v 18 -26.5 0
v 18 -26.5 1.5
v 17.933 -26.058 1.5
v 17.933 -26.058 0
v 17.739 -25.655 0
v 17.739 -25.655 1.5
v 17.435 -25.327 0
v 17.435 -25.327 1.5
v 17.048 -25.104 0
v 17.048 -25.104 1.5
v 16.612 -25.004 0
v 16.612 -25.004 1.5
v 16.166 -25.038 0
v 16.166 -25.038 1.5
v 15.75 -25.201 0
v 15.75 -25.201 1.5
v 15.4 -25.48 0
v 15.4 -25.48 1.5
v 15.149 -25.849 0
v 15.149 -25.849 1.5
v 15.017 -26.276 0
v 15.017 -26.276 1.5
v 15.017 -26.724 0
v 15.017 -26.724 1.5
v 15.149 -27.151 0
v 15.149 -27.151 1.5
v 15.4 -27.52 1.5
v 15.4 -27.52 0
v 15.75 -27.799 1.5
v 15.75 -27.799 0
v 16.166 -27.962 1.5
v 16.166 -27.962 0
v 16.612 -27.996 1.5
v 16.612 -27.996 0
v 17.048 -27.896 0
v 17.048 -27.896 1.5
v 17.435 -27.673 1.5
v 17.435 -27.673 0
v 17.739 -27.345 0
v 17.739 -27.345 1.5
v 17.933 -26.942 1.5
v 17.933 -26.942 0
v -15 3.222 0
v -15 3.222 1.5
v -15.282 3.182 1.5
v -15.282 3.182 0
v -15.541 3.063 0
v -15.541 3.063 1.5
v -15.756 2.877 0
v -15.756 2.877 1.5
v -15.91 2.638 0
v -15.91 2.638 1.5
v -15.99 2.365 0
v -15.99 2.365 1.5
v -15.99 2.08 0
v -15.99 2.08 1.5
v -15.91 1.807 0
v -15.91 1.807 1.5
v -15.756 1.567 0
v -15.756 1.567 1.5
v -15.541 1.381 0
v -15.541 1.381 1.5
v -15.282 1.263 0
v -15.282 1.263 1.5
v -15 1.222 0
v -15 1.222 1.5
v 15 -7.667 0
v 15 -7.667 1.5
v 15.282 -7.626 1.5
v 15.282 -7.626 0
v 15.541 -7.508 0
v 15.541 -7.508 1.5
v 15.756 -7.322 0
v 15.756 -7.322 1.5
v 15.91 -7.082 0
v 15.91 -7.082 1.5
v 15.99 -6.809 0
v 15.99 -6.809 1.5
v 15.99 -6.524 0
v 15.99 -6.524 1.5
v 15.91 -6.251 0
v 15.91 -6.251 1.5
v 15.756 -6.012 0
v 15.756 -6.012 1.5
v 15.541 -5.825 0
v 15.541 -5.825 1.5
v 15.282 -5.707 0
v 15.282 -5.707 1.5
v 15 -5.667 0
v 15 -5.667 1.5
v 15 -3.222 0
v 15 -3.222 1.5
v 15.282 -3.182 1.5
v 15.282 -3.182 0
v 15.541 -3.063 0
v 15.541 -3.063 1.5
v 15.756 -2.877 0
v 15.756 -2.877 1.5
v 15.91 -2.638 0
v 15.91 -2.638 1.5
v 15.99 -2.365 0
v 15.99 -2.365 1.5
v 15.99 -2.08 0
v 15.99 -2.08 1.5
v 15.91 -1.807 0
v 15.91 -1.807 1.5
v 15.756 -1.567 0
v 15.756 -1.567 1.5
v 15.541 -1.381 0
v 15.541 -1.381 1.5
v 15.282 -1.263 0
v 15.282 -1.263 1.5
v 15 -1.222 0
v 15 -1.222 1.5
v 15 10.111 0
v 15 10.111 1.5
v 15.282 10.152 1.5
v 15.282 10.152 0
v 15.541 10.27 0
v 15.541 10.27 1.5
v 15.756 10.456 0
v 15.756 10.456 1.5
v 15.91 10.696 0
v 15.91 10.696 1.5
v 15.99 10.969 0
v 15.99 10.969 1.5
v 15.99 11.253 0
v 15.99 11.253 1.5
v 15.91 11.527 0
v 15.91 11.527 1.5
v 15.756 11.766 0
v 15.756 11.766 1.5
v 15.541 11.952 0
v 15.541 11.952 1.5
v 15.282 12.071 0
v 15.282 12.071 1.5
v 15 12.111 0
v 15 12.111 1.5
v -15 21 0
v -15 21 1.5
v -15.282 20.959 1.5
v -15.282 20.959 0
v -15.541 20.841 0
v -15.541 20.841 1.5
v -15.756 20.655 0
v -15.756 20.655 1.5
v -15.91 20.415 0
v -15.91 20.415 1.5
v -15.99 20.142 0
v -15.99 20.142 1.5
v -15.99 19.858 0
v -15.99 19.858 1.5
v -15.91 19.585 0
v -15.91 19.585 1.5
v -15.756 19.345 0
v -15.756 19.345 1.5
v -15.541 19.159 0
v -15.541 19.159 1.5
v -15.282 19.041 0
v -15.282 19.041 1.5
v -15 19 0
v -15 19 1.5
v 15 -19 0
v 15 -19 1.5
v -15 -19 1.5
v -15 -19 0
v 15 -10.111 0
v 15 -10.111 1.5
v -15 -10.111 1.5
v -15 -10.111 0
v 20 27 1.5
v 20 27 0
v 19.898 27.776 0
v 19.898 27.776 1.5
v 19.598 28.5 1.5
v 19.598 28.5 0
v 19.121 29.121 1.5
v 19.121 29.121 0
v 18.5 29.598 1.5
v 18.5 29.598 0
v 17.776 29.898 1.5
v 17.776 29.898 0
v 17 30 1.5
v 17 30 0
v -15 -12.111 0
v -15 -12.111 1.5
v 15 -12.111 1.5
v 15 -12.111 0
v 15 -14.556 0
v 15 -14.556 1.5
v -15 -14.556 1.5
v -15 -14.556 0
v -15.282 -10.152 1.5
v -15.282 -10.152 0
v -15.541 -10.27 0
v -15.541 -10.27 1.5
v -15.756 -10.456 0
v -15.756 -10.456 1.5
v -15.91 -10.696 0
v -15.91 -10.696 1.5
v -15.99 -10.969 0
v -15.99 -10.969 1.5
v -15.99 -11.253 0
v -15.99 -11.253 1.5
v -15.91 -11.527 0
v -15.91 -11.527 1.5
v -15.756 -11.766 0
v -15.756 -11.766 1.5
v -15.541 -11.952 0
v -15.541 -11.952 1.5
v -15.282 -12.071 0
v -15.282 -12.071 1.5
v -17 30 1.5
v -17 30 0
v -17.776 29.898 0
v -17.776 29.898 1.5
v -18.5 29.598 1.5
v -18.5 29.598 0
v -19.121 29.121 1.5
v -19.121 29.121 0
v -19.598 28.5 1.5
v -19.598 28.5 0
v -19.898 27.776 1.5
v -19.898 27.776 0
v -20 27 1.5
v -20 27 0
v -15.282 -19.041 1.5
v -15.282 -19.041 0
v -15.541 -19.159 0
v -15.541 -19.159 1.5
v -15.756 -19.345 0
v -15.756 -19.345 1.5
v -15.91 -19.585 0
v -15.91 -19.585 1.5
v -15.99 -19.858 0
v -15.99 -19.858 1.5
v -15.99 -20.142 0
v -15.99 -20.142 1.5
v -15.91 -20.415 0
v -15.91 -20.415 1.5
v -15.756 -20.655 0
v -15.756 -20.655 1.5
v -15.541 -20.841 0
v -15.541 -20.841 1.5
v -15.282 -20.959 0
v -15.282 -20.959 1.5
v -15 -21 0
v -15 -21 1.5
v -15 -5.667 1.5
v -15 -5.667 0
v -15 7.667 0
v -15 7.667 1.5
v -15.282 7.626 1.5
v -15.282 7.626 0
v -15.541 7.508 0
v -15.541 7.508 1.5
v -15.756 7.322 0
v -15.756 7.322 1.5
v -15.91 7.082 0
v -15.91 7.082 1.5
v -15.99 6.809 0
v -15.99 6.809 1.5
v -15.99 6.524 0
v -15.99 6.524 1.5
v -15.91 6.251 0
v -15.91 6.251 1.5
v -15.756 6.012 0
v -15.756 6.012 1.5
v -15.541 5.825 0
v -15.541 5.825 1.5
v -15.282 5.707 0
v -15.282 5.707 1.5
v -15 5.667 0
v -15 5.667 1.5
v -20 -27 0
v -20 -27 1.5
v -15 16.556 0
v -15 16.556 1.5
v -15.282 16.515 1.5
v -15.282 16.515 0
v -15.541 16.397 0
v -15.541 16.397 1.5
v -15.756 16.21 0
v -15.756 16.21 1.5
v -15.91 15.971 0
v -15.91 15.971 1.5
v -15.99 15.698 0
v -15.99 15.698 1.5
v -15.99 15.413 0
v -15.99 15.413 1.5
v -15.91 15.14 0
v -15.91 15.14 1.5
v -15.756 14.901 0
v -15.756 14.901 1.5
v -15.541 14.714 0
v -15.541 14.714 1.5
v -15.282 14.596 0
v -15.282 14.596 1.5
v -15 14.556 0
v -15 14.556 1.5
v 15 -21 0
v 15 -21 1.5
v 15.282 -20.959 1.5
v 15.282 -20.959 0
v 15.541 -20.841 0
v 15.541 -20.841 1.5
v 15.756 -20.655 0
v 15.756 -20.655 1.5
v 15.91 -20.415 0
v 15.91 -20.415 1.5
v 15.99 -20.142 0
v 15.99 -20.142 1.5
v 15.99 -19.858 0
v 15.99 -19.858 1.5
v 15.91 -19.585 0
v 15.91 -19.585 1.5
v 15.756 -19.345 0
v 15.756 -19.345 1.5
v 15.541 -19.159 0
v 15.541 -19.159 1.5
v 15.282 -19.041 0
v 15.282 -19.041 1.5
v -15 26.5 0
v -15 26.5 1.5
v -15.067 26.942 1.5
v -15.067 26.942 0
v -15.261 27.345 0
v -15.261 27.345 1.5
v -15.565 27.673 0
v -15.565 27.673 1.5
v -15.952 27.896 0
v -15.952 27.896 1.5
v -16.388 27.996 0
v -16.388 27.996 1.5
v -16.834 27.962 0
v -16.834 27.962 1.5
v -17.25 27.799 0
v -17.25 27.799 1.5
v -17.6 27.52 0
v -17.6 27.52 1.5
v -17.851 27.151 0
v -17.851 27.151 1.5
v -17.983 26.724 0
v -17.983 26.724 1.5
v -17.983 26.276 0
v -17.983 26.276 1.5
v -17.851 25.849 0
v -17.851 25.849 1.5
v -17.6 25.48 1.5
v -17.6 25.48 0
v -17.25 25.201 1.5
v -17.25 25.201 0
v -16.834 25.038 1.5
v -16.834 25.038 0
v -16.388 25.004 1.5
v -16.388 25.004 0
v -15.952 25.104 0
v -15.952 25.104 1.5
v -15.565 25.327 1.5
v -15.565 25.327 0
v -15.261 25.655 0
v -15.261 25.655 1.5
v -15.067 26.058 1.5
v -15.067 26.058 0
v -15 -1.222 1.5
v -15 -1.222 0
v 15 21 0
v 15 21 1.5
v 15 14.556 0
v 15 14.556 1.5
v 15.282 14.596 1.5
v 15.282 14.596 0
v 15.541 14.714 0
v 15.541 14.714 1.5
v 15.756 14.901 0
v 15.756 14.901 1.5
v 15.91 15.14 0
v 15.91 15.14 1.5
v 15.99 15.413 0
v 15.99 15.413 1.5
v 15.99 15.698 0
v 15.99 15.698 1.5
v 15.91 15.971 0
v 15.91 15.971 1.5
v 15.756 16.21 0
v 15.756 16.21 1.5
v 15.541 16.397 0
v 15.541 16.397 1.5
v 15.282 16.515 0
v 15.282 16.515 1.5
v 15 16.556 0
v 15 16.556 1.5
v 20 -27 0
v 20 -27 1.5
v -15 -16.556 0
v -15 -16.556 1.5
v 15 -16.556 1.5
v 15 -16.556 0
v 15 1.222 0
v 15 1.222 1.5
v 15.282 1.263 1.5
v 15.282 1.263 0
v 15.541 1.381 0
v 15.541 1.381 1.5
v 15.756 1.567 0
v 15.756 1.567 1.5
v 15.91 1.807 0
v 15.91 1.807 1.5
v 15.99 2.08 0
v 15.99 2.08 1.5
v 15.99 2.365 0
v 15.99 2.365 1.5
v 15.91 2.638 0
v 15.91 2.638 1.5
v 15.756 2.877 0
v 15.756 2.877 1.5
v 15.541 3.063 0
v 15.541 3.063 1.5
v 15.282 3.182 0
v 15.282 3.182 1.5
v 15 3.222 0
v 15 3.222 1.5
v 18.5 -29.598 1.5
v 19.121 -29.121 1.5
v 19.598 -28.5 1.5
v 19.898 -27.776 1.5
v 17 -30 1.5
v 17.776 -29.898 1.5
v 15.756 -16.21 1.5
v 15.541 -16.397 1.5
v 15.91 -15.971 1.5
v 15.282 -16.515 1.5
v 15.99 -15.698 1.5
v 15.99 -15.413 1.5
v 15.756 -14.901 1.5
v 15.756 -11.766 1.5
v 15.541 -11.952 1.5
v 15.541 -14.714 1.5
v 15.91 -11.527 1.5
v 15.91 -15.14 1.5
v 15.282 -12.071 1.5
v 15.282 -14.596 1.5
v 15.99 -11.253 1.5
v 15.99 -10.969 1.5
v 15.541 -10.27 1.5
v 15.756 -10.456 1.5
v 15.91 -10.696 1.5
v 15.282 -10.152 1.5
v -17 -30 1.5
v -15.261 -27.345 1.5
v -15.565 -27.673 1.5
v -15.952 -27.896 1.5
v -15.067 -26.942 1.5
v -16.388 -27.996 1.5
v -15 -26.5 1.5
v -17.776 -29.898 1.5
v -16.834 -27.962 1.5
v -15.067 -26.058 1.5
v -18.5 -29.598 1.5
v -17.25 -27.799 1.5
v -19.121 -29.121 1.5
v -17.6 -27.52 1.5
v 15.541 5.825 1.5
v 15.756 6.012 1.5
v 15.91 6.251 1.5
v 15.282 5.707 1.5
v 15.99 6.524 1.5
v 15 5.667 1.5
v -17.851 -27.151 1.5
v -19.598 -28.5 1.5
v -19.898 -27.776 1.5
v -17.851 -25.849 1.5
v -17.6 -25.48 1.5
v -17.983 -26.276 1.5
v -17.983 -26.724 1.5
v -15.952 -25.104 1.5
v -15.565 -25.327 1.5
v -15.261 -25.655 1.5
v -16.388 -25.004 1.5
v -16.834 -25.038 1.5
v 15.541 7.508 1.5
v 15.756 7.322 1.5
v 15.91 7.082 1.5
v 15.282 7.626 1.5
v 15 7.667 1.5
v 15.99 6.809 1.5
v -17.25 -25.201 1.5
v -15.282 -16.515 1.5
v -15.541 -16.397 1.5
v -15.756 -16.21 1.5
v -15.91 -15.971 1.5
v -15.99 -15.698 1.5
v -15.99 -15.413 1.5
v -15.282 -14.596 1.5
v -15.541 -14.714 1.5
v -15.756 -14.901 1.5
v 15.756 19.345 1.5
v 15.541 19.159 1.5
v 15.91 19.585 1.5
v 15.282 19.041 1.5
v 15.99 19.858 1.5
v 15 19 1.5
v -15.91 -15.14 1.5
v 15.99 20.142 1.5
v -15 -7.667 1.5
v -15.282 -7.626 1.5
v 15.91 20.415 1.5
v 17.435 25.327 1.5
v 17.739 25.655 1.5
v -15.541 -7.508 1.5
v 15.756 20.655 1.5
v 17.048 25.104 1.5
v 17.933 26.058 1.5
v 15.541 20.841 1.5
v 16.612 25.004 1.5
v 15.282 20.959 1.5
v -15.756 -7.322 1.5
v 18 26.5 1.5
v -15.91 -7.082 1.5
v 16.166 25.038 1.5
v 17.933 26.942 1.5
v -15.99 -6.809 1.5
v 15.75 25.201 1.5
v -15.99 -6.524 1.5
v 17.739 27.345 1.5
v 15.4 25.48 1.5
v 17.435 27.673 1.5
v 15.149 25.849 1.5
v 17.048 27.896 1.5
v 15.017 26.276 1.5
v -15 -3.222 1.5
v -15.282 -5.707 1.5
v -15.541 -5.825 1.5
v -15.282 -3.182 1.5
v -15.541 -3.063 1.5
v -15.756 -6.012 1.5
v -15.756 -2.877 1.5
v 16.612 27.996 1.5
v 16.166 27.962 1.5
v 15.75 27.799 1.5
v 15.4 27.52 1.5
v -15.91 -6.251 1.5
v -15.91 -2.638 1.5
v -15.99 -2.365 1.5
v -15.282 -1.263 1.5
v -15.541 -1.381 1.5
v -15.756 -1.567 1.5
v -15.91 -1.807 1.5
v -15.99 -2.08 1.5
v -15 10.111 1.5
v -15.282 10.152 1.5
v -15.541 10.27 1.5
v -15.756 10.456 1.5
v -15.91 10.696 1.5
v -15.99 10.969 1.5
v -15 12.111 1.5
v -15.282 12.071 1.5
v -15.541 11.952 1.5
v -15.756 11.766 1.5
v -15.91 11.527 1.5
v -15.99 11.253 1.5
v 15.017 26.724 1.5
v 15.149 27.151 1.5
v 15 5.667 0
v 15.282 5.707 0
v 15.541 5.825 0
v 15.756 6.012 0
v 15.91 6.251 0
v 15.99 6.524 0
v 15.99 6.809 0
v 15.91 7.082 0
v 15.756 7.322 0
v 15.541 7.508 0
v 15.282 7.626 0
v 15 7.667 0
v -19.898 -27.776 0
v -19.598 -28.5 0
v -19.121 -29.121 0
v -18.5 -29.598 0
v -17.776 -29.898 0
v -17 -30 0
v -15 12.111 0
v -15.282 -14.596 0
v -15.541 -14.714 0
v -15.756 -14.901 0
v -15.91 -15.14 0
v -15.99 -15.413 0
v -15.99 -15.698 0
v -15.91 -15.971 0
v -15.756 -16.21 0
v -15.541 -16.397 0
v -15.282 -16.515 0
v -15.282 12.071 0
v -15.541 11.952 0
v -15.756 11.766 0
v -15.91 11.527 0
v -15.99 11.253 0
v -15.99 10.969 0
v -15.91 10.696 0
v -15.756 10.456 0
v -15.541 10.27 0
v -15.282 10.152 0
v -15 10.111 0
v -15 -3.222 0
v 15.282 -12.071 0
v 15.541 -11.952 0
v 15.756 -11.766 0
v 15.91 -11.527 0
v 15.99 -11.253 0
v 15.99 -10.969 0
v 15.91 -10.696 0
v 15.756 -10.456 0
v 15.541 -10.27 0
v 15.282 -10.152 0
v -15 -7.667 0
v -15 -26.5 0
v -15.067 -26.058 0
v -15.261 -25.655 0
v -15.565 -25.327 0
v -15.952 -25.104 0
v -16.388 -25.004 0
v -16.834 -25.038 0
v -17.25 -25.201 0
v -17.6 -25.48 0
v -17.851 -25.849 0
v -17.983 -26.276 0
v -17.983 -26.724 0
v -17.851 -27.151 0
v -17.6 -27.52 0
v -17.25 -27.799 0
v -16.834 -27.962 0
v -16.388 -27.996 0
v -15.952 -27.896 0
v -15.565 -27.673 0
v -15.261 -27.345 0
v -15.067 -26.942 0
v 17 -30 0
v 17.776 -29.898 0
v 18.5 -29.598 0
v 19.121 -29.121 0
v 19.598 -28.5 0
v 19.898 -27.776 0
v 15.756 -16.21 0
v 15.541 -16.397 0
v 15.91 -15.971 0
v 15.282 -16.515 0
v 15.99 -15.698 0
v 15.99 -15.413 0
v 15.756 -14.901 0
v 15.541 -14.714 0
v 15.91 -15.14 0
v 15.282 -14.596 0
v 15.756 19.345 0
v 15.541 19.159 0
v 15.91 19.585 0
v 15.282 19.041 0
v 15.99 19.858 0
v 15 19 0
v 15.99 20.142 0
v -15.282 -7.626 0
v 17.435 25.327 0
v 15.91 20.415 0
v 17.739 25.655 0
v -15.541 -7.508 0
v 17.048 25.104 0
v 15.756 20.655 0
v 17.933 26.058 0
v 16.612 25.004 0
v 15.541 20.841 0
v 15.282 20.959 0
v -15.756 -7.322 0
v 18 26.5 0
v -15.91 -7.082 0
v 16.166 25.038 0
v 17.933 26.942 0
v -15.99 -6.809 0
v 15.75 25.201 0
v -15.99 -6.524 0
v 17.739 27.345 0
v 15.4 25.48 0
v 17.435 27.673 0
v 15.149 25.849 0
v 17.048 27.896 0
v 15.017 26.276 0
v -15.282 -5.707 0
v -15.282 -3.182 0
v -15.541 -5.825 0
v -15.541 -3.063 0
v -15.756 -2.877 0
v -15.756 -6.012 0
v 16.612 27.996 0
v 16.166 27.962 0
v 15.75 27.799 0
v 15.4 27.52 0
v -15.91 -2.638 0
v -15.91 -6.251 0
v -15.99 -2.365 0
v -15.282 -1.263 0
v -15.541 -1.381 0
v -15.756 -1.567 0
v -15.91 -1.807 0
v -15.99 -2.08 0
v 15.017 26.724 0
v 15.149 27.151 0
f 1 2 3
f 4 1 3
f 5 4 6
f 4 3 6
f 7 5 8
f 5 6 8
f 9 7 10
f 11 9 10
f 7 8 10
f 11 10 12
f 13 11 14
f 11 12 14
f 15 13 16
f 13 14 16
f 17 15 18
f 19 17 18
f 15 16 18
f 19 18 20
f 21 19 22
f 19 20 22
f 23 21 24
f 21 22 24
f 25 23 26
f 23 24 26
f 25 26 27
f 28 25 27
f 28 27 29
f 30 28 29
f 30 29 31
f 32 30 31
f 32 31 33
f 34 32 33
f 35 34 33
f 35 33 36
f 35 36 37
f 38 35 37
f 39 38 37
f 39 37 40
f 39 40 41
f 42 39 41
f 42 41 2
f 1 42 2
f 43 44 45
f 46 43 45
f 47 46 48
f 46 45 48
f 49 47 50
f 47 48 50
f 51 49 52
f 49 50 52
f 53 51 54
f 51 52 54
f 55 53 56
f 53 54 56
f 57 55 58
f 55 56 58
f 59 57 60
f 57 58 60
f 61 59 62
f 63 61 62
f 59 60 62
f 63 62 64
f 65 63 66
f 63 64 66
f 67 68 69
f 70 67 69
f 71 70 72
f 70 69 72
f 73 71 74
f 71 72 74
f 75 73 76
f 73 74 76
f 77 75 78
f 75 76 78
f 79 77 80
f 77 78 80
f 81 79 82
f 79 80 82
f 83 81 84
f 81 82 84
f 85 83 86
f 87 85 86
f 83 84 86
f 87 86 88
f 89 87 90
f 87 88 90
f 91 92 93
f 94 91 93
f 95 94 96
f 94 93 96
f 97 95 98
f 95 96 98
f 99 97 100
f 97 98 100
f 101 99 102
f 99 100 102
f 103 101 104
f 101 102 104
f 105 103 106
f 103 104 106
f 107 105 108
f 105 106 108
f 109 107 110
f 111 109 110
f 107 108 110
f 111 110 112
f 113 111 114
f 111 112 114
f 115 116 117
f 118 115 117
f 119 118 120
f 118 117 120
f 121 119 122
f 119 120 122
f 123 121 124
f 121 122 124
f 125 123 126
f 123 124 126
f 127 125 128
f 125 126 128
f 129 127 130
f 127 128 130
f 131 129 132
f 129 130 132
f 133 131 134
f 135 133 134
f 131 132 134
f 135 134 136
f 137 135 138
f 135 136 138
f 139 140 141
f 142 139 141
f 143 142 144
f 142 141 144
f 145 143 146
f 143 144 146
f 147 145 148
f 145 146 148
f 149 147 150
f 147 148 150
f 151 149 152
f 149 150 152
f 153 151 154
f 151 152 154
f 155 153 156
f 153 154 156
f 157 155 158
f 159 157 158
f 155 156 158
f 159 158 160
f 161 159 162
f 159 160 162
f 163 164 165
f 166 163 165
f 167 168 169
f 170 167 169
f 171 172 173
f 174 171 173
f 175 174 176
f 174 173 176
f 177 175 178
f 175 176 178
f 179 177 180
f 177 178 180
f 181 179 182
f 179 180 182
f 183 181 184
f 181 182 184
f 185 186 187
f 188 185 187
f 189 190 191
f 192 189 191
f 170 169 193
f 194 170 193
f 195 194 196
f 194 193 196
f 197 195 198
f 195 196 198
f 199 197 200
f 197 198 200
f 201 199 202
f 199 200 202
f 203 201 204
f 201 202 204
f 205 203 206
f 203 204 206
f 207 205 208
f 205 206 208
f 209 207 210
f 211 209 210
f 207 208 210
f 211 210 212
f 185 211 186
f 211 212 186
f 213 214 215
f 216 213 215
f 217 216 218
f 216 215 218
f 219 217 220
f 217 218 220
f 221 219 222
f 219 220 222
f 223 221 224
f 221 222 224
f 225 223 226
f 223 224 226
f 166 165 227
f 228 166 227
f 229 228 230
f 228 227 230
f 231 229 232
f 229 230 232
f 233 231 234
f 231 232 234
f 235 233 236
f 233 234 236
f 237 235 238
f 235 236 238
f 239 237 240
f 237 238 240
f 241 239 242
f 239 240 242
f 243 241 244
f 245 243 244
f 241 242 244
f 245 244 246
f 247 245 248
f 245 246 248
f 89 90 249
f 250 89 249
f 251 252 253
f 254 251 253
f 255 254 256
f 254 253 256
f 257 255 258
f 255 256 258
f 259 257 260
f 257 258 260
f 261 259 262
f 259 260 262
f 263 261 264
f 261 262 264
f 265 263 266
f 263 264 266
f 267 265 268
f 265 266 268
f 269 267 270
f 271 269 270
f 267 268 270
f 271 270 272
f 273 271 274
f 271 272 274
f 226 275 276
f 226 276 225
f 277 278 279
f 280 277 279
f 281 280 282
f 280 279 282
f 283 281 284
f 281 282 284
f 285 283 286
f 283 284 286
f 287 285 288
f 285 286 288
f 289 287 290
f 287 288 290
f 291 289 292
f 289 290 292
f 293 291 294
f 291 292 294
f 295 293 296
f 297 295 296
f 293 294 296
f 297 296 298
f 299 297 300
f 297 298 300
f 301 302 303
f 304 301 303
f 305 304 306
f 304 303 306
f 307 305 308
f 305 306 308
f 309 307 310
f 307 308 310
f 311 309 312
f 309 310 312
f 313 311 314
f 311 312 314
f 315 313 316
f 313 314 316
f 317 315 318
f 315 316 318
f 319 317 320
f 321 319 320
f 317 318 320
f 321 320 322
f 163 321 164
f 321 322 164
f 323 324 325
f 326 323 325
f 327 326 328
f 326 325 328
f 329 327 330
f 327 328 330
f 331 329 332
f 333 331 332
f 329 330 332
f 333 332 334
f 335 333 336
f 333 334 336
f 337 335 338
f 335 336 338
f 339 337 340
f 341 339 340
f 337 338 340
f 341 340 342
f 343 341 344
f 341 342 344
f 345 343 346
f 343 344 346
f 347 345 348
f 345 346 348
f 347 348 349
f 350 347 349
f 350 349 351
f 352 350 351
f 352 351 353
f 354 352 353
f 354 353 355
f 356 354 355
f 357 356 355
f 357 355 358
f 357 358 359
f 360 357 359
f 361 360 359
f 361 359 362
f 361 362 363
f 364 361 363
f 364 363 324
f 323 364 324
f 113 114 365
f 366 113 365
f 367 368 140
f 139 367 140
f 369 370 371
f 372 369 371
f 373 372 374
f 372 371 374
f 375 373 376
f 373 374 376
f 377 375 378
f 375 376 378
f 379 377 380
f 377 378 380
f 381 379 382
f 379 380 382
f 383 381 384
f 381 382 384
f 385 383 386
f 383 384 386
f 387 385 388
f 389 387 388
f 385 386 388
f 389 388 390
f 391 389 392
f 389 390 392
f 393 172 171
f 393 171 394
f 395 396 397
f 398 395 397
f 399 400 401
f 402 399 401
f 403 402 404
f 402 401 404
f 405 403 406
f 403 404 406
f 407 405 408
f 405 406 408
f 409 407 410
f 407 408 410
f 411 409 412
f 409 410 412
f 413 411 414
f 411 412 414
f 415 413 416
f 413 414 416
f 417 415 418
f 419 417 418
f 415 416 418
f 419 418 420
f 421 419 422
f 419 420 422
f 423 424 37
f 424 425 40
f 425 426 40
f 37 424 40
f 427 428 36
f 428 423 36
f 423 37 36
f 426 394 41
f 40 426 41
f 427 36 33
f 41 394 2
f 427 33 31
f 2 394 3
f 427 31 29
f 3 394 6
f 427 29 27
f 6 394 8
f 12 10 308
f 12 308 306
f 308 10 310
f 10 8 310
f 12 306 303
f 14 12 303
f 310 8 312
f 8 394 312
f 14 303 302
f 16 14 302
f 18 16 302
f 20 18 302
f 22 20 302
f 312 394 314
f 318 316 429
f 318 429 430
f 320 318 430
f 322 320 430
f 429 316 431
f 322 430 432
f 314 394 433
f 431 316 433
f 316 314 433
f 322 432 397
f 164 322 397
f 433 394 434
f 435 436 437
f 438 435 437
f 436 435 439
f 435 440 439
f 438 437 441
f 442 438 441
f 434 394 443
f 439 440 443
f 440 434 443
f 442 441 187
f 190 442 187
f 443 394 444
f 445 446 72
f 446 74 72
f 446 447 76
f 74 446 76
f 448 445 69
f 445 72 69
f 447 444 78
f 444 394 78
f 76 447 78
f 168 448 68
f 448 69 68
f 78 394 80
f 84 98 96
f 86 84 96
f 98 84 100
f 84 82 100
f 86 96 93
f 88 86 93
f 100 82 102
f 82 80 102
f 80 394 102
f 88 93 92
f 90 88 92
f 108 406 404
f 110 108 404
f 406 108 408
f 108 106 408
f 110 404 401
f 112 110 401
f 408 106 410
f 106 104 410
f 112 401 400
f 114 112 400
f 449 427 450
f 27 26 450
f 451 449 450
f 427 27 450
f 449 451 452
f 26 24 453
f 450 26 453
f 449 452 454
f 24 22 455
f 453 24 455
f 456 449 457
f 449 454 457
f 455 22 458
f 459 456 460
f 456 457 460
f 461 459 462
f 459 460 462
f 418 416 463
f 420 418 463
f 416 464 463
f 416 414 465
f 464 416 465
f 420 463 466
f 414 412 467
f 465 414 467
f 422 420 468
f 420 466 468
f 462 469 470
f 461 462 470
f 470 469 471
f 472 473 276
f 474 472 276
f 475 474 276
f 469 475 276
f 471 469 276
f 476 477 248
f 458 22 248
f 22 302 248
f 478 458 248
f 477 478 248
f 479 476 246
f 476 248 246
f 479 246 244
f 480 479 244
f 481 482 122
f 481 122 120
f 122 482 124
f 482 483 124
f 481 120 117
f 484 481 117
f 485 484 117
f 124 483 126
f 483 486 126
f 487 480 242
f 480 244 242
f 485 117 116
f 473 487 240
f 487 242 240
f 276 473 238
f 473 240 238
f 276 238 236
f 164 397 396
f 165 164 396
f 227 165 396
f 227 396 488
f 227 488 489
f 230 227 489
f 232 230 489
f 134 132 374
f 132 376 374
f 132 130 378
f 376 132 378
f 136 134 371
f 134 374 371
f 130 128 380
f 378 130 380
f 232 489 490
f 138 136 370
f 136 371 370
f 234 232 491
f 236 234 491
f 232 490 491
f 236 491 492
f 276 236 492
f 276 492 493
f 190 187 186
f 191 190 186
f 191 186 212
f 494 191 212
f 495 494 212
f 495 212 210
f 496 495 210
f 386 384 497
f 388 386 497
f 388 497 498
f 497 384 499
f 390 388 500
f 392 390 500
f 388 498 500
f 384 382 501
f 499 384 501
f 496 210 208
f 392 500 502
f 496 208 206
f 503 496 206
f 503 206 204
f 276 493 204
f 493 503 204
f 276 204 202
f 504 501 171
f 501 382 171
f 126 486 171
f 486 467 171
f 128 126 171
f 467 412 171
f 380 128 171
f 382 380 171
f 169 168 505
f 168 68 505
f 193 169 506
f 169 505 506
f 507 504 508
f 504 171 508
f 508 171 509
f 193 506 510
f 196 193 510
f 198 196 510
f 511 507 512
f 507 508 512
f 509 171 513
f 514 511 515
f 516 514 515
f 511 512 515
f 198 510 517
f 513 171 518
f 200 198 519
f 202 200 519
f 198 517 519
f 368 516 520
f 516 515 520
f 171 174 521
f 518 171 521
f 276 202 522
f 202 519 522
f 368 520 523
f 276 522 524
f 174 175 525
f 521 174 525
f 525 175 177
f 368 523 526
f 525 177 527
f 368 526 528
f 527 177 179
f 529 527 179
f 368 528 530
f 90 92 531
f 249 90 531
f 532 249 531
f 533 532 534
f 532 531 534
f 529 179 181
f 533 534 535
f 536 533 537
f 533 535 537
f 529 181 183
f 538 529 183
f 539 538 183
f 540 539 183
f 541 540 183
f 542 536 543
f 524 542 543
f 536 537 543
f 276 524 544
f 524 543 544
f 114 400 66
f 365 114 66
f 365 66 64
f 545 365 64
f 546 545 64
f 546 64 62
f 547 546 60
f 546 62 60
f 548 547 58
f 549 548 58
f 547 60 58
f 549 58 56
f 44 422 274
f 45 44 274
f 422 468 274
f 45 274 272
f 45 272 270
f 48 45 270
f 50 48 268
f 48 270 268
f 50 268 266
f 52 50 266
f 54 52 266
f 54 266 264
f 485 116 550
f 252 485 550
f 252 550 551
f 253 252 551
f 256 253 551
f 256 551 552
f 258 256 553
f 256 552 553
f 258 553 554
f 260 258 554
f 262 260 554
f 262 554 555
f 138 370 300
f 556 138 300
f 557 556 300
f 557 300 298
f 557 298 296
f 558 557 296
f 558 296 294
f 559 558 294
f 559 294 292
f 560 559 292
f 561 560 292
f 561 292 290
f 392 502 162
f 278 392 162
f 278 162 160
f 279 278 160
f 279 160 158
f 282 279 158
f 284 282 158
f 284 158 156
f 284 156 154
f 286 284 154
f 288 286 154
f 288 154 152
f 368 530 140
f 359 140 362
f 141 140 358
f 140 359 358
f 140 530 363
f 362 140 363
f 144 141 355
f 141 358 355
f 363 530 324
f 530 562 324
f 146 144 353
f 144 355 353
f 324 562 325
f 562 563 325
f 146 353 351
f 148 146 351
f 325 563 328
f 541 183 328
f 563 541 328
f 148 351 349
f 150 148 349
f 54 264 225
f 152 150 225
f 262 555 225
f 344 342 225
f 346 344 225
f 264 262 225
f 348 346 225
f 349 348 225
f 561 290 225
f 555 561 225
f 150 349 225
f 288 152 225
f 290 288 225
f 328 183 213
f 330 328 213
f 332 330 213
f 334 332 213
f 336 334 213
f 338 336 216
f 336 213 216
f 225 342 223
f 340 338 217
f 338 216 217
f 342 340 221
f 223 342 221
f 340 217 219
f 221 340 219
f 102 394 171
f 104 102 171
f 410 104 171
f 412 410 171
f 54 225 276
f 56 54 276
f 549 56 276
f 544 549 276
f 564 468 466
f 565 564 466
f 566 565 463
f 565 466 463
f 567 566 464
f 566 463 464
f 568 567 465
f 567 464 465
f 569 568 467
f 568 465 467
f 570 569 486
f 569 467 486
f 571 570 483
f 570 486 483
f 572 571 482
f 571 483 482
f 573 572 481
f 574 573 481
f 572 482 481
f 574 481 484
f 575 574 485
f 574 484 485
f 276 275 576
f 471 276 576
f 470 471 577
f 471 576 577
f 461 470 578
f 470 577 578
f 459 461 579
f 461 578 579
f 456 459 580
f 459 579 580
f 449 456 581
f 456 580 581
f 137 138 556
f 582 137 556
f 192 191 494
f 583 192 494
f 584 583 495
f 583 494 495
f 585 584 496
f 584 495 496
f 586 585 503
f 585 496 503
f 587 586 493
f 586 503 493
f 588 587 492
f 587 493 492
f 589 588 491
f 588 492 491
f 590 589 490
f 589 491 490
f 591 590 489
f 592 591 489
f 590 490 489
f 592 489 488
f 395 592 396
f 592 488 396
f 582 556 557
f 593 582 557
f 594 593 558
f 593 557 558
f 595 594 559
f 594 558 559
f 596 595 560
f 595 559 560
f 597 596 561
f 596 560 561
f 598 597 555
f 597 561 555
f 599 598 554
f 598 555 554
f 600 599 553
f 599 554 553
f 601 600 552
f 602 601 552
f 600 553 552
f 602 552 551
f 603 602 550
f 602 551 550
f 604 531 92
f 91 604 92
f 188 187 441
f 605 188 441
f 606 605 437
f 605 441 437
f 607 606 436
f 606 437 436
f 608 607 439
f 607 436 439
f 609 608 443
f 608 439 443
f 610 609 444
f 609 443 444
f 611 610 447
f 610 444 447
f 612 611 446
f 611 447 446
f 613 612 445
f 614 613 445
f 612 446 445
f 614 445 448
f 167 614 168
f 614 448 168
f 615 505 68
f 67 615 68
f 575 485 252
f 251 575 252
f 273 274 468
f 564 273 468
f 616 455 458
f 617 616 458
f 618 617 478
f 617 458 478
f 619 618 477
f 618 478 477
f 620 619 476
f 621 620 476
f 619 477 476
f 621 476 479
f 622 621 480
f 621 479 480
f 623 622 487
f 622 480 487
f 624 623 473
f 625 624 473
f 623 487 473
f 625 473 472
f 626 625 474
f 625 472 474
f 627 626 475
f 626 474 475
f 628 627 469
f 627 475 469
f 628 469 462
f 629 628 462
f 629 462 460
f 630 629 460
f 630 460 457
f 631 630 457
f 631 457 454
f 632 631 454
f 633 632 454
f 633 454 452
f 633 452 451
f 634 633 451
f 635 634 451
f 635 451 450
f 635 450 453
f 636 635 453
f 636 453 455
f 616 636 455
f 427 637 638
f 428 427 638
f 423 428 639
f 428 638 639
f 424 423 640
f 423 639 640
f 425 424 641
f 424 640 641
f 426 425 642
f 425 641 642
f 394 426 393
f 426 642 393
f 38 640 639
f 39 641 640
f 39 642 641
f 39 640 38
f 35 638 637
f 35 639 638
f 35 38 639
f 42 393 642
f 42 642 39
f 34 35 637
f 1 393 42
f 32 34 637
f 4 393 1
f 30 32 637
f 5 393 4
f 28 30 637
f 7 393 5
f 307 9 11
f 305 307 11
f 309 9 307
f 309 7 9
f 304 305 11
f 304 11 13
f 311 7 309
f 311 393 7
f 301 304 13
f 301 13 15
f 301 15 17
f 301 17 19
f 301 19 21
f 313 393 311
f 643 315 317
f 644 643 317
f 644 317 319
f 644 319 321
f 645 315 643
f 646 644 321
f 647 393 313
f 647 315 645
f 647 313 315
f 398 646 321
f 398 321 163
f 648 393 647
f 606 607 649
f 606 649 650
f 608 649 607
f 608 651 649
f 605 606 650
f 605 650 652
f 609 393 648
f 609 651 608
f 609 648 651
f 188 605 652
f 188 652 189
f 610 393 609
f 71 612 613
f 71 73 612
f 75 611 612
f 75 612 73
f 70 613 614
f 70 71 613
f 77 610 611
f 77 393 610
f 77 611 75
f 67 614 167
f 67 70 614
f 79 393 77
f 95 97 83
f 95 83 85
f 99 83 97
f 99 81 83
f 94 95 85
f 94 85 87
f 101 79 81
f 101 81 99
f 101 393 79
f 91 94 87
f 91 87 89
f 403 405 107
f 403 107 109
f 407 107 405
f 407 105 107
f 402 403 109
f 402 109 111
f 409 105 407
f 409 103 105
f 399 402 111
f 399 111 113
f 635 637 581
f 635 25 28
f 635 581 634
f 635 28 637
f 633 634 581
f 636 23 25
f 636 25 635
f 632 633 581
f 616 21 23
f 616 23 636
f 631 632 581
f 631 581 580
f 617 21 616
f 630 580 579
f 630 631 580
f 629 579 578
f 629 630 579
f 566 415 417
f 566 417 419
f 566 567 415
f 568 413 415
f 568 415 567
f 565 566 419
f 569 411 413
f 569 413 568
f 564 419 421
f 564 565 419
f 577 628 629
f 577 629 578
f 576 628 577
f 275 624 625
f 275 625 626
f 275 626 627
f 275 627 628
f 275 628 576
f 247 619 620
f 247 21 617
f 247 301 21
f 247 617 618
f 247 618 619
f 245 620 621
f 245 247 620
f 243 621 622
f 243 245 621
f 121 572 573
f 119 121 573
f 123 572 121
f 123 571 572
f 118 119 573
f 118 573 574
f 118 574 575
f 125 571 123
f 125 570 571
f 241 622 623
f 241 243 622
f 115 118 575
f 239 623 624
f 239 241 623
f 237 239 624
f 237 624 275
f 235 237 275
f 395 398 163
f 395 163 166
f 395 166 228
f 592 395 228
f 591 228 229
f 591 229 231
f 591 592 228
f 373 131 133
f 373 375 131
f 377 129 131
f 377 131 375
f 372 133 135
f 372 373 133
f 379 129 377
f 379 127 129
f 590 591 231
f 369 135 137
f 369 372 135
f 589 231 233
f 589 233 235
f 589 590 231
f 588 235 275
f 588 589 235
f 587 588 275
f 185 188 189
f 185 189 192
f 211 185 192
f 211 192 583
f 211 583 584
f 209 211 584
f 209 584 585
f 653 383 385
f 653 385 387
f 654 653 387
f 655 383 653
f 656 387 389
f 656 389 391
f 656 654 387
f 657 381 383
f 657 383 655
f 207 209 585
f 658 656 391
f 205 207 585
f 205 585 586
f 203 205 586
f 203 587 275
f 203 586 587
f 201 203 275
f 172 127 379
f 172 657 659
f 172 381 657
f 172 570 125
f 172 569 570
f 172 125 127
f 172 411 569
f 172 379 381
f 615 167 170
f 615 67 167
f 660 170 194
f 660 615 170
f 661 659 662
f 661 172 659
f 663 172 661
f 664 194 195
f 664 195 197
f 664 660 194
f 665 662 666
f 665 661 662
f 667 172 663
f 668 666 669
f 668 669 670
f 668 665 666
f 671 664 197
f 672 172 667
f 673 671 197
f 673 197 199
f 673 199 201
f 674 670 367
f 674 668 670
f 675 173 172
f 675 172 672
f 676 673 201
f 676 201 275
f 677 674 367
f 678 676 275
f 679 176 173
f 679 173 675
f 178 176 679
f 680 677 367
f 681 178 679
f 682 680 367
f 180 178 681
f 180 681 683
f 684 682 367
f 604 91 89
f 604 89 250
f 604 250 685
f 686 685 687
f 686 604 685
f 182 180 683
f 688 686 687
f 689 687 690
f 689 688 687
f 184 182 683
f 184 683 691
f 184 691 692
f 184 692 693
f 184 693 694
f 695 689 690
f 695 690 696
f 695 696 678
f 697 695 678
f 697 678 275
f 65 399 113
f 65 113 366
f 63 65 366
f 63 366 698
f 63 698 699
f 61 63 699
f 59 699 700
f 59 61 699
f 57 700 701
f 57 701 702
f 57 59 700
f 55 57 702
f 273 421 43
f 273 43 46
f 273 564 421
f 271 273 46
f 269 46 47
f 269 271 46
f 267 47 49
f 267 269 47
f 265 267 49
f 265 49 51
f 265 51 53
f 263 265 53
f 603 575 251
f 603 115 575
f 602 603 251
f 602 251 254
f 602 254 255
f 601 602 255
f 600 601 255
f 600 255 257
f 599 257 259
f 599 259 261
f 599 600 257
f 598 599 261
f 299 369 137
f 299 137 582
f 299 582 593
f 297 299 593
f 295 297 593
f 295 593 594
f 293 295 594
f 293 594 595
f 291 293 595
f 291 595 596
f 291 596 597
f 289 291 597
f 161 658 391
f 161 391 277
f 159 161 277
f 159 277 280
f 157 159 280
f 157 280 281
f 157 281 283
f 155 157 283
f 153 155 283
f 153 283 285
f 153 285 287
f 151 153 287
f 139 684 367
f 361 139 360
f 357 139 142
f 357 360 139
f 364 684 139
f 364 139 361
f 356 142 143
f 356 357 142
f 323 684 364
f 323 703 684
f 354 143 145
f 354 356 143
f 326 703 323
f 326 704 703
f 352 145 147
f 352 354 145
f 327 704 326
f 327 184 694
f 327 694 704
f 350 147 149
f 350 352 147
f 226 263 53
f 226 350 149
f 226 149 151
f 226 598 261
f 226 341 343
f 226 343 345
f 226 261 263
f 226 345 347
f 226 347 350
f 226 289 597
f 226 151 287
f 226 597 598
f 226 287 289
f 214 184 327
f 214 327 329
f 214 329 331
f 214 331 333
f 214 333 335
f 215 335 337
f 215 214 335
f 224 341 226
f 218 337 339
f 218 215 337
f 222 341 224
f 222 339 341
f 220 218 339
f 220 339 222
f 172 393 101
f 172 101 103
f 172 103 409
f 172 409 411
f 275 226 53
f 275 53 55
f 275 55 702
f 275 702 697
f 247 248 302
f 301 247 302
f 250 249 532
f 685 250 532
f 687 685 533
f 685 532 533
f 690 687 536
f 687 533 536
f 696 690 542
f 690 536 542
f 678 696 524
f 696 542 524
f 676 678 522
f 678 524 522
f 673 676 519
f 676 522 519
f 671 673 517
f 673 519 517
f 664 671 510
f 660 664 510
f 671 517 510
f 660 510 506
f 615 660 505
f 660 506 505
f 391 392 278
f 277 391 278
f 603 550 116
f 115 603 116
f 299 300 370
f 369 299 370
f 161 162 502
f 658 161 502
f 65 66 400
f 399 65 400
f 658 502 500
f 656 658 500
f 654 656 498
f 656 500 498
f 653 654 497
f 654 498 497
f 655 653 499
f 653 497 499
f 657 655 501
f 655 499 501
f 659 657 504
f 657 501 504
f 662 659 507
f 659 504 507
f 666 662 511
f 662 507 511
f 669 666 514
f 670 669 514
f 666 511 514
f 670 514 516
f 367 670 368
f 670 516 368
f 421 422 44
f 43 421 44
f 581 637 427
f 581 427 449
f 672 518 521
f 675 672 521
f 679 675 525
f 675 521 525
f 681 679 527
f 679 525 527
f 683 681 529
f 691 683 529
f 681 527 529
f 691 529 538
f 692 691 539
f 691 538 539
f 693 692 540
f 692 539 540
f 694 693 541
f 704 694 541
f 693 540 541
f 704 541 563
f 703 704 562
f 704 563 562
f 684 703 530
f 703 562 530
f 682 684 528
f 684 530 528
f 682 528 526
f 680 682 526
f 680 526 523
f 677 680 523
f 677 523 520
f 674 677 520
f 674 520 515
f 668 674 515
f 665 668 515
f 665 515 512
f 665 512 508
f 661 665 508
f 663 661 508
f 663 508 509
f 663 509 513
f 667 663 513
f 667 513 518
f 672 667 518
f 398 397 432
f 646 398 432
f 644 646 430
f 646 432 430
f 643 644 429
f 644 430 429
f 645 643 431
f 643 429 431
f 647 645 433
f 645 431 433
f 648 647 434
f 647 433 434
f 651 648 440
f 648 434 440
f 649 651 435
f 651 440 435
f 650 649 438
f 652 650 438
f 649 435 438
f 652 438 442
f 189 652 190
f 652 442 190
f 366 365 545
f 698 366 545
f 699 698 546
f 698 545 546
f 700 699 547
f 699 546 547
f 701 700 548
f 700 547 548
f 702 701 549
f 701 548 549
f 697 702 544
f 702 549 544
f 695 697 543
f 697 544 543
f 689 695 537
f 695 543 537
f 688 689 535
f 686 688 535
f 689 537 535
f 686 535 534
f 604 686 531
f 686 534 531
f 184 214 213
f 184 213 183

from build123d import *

# Parameters (mm, degrees)
PAD_DEPTH           = 1.5
POCKET_DEPTH        = 5
LINEARPATTERN_COUNT = 10
LINEARPATTERN_PITCH = 4.444444
SKETCH002_R         = 1.5
POCKET001_DEPTH     = 5


with BuildPart() as part:
    # Sketch → Pad (new body)
    with BuildSketch(Plane.XY):
        with BuildLine():
            Line((-17, 30), (17, 30))
            ThreePointArc((20, 27), (19.12132, 29.12132), (17, 30))
            Line((20, 27), (20, -27))
            ThreePointArc((17, -30), (19.12132, -29.12132), (20, -27))
            Line((17, -30), (-17, -30))
            ThreePointArc((-20, -27), (-19.12132, -29.12132), (-17, -30))
            Line((-20, -27), (-20, 27))
            ThreePointArc((-17, 30), (-19.12132, 29.12132), (-20, 27))
        make_face()
    extrude(amount=PAD_DEPTH)

    # Sketch001 (on Face10 of Pad) → Pocket (cut)
    with BuildSketch(Plane.XY.offset(1.5)):
        with BuildLine():
            ThreePointArc((-15, 21), (-16, 20), (-15, 19))
            Line((-15, 19), (15, 19))
            ThreePointArc((15, 19), (16, 20), (15, 21))
            Line((15, 21), (-15, 21))
        make_face()
    pocket = extrude(amount=-POCKET_DEPTH, mode=Mode.SUBTRACT)

    # LinearPattern: Pocket ×10
    with Locations(*[(0, -i * LINEARPATTERN_PITCH, 0) for i in range(1, LINEARPATTERN_COUNT)]):
        add(pocket, mode=Mode.SUBTRACT)

    # Sketch002 (on Face5 of LinearPattern) → Pocket001 (cut)
    with BuildSketch(Plane.XY.offset(1.5)):
        with Locations((-16.5, 26.5)):
            Circle(SKETCH002_R)
        with Locations((16.5, 26.5)):
            Circle(SKETCH002_R)
        with Locations((16.5, -26.5)):
            Circle(SKETCH002_R)
        with Locations((-16.5, -26.5)):
            Circle(SKETCH002_R)
    extrude(amount=-POCKET001_DEPTH, mode=Mode.SUBTRACT)


solid = part.part
